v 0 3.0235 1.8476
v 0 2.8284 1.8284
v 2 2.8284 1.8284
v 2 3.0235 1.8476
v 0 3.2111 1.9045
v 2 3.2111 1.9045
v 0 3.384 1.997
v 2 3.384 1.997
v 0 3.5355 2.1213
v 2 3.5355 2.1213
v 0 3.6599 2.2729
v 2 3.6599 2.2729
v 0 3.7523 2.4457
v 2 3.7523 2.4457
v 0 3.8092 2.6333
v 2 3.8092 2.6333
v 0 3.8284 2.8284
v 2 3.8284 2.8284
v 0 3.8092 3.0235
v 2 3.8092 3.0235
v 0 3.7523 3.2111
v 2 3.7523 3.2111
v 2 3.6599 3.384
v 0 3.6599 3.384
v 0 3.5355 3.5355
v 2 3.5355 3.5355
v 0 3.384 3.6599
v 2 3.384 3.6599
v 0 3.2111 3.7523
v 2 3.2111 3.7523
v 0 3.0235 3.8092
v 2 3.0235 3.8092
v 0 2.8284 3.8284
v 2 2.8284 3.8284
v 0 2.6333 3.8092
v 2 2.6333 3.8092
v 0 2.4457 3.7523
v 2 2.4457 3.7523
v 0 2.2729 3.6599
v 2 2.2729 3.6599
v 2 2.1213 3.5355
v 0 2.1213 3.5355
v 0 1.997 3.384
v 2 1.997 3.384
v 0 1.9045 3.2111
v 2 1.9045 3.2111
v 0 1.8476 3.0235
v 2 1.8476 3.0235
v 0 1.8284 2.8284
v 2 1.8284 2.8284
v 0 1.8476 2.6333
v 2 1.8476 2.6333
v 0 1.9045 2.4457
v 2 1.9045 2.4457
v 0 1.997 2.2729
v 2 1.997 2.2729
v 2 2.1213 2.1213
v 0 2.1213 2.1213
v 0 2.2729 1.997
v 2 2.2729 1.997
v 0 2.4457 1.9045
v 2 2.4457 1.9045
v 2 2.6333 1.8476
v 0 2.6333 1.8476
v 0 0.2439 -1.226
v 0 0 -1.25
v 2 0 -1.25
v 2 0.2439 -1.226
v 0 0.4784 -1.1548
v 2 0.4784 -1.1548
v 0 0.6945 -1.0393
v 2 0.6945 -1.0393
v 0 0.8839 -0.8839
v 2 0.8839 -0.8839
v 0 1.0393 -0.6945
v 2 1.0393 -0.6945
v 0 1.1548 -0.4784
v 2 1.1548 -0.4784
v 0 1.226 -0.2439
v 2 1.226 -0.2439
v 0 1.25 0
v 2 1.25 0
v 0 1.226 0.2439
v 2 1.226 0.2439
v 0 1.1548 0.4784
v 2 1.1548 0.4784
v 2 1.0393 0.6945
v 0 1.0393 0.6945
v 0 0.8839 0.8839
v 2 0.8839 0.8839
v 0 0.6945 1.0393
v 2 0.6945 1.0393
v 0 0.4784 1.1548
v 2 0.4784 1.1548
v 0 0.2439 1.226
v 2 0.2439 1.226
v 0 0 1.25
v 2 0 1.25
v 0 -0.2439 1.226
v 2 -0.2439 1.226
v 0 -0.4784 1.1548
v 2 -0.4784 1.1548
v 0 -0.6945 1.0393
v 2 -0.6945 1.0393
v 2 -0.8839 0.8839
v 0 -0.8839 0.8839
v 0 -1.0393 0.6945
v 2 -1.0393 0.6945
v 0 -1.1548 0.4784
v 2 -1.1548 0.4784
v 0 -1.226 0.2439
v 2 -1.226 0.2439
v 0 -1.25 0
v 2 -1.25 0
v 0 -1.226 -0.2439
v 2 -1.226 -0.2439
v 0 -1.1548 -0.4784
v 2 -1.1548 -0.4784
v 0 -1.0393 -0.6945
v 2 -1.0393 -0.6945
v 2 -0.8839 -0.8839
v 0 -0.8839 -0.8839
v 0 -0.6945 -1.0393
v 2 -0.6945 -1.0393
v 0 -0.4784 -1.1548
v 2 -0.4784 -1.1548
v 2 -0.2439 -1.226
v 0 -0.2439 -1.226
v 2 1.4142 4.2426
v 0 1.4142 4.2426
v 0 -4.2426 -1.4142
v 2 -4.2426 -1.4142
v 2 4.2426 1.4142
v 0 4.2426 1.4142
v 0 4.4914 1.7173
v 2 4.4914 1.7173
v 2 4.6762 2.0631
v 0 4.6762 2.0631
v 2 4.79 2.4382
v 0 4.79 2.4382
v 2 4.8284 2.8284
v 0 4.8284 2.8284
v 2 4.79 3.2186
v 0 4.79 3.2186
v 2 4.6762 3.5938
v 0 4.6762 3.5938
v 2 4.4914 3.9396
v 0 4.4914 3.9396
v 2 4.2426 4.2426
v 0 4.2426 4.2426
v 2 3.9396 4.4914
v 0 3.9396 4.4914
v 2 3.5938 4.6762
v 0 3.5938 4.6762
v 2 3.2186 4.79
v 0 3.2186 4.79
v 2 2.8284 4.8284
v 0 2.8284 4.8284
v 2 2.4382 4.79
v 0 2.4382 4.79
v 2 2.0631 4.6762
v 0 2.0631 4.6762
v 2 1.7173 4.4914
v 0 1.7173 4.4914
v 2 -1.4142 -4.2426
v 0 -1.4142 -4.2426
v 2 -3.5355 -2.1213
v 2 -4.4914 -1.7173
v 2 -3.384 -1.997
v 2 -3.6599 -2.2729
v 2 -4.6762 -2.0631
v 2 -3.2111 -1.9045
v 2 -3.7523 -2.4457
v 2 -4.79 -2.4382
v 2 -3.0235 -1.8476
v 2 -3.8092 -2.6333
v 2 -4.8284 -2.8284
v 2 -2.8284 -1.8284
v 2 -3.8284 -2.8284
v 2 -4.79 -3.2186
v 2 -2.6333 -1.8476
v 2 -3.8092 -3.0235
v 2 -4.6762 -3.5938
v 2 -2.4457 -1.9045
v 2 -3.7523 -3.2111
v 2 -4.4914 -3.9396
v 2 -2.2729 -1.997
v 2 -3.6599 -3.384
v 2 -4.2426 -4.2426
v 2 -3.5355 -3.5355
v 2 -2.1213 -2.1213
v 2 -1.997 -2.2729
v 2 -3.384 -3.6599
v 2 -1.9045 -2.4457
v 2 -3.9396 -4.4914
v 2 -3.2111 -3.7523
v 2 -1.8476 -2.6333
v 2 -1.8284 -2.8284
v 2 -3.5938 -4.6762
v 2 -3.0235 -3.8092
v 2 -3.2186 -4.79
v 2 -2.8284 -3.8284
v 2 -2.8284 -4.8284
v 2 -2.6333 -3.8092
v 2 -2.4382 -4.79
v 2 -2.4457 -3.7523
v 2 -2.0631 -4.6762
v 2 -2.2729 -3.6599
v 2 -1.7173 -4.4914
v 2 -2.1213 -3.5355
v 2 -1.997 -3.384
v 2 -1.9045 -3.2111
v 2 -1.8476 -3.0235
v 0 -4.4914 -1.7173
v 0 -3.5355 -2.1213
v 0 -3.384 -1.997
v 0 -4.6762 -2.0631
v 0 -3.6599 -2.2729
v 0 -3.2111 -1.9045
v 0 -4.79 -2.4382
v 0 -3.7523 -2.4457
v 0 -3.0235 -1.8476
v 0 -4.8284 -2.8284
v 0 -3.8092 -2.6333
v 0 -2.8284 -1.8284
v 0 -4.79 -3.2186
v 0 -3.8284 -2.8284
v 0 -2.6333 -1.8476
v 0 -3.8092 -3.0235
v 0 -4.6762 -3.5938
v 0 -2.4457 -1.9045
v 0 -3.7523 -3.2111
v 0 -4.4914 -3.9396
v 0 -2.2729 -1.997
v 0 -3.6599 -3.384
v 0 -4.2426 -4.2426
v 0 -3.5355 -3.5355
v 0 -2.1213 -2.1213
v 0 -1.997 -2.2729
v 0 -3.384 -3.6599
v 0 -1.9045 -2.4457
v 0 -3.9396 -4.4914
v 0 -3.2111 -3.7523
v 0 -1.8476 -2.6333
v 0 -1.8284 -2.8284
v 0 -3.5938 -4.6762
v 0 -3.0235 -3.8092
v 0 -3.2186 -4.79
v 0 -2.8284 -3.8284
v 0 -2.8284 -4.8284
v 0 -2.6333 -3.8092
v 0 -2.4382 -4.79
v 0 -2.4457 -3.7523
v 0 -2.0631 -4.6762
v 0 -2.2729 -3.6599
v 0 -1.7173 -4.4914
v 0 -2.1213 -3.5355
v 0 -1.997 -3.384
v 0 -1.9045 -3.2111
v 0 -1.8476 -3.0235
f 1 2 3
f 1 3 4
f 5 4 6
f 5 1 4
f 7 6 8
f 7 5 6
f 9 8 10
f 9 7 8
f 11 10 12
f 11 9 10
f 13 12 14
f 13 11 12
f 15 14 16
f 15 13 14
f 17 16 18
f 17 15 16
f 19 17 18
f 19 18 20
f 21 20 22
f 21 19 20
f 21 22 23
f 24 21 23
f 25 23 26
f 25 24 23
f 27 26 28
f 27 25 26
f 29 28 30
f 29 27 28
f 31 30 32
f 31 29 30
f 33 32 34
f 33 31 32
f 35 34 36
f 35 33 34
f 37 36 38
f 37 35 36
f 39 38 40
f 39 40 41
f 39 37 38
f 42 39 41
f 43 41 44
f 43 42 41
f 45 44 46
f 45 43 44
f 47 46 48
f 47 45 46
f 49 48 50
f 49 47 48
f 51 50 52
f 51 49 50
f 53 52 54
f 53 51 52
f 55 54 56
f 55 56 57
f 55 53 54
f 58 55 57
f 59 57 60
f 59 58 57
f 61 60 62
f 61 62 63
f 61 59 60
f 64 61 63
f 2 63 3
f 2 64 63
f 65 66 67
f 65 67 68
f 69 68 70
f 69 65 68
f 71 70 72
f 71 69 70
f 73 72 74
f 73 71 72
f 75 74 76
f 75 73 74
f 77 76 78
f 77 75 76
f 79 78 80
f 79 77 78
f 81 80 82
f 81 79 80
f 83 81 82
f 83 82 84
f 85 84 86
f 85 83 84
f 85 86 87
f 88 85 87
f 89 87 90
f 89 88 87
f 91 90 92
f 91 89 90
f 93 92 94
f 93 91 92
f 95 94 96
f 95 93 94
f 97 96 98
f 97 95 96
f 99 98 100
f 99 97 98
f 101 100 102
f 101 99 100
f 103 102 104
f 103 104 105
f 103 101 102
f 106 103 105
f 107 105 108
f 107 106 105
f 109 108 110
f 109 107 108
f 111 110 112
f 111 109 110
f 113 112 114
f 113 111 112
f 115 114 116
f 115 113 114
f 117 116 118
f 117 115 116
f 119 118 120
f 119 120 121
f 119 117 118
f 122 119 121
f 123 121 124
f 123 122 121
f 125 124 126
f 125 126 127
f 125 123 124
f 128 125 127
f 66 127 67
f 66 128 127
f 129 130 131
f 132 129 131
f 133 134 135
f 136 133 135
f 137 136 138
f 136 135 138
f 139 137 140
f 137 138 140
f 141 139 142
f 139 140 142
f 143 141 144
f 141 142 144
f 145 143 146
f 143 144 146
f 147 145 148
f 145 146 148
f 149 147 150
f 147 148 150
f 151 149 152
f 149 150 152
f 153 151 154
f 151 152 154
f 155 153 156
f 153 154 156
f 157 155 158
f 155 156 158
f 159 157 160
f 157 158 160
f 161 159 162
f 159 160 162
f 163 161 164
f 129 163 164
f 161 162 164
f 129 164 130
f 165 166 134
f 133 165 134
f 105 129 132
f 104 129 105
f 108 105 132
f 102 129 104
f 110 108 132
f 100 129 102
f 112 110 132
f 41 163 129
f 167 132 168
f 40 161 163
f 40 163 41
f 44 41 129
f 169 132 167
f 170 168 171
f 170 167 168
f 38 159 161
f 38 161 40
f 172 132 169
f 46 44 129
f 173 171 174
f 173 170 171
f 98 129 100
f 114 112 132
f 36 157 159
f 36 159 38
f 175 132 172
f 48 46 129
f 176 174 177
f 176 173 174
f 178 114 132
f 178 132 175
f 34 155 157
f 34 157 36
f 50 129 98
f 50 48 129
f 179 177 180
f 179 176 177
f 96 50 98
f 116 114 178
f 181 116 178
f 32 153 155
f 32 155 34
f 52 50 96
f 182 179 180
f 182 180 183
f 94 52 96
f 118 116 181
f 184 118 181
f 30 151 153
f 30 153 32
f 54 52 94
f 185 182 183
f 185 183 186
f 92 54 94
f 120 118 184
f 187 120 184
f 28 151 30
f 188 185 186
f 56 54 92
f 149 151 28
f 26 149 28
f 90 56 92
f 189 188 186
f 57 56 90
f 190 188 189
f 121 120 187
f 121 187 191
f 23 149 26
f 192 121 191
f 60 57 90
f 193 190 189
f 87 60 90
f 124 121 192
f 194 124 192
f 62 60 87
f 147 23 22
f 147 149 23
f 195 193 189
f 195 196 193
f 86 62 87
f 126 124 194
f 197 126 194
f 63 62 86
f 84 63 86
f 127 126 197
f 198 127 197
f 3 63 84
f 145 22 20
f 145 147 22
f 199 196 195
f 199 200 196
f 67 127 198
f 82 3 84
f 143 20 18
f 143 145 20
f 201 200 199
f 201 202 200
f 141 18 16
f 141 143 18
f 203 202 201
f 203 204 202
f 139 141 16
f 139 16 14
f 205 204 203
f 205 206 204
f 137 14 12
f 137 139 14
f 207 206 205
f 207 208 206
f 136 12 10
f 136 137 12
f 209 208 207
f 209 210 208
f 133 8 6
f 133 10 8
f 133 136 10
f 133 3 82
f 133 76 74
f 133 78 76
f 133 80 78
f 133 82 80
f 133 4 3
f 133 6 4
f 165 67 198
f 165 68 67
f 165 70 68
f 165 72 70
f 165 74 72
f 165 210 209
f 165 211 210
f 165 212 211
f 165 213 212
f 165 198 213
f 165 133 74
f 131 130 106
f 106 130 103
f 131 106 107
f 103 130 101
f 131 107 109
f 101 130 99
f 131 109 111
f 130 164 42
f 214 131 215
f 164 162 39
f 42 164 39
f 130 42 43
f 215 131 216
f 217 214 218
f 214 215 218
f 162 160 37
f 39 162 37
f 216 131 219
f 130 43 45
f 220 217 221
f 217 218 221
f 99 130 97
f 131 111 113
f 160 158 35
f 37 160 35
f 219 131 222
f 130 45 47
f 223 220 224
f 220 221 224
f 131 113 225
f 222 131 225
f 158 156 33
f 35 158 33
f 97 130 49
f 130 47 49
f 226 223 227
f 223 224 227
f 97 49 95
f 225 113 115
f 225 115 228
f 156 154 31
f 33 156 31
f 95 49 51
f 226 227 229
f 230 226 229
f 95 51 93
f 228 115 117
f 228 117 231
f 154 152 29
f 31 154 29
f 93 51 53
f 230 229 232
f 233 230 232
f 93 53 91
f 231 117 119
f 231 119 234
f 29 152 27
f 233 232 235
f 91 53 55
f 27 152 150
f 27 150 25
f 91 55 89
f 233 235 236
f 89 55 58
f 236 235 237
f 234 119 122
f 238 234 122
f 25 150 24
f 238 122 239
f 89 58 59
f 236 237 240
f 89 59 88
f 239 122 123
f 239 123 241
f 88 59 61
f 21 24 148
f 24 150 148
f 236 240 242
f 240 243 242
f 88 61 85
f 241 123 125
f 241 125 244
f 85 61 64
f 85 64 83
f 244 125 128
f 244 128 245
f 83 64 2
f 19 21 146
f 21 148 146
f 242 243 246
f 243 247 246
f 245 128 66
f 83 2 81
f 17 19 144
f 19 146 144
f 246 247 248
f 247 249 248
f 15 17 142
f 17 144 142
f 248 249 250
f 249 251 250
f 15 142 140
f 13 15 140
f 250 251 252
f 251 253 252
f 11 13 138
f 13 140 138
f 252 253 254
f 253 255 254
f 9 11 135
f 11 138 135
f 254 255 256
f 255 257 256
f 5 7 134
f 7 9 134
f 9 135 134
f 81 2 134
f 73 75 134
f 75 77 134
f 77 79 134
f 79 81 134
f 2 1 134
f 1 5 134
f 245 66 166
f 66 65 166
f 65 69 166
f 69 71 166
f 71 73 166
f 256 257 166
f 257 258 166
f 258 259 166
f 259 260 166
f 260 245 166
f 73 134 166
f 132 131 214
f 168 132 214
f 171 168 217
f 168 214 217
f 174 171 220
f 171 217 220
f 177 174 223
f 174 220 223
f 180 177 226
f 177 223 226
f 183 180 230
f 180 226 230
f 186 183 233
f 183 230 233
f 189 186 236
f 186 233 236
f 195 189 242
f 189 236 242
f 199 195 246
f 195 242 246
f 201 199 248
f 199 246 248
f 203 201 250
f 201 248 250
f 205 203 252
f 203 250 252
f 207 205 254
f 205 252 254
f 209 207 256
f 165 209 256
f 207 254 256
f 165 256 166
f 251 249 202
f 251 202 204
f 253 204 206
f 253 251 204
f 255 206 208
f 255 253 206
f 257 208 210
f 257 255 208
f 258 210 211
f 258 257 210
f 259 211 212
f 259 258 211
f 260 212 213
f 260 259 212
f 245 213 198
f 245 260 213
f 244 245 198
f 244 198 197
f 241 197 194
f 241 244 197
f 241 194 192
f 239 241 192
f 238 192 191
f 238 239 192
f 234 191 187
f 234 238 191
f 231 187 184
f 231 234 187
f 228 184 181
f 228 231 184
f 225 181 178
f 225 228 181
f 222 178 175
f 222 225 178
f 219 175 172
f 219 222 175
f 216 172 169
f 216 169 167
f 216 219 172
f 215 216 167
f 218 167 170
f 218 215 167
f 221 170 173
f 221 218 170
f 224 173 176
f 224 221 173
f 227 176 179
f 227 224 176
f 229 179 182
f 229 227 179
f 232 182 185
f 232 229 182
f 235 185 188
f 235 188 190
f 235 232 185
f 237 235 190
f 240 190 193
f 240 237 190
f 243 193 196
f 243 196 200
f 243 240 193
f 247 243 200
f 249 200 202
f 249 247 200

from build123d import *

# Parameters (mm, degrees)
SKETCH1_R           = 1
SKETCH1_R_2         = 1.25
BOSS_EXTRUDE1_DEPTH = 2


with BuildPart() as part:
    # Sketch1 → Boss-Extrude1 (new body)
    with BuildSketch(Plane(origin=(0, 0, 0), x_dir=(0, 0, -1), z_dir=(1, 0, 0))):
        with BuildLine():
            ThreePointArc((-1.414213562, 4.242640687), (-4.242640687, 4.242640687), (-4.242640687, 1.414213562))
            Line((-4.242640687, 1.414213562), (1.414213562, -4.242640687))
            ThreePointArc((1.414213562, -4.242640687), (4.242640687, -4.242640687), (4.242640687, -1.414213562))
            Line((4.242640687, -1.414213562), (-1.414213562, 4.242640687))
        make_face()
        with Locations((2.828427125, -2.828427125)):
            Circle(SKETCH1_R, mode=Mode.SUBTRACT)
        with Locations((-2.828427125, 2.828427125)):
            Circle(SKETCH1_R, mode=Mode.SUBTRACT)
        Circle(SKETCH1_R_2, mode=Mode.SUBTRACT)
    extrude(amount=BOSS_EXTRUDE1_DEPTH)


solid = part.part
